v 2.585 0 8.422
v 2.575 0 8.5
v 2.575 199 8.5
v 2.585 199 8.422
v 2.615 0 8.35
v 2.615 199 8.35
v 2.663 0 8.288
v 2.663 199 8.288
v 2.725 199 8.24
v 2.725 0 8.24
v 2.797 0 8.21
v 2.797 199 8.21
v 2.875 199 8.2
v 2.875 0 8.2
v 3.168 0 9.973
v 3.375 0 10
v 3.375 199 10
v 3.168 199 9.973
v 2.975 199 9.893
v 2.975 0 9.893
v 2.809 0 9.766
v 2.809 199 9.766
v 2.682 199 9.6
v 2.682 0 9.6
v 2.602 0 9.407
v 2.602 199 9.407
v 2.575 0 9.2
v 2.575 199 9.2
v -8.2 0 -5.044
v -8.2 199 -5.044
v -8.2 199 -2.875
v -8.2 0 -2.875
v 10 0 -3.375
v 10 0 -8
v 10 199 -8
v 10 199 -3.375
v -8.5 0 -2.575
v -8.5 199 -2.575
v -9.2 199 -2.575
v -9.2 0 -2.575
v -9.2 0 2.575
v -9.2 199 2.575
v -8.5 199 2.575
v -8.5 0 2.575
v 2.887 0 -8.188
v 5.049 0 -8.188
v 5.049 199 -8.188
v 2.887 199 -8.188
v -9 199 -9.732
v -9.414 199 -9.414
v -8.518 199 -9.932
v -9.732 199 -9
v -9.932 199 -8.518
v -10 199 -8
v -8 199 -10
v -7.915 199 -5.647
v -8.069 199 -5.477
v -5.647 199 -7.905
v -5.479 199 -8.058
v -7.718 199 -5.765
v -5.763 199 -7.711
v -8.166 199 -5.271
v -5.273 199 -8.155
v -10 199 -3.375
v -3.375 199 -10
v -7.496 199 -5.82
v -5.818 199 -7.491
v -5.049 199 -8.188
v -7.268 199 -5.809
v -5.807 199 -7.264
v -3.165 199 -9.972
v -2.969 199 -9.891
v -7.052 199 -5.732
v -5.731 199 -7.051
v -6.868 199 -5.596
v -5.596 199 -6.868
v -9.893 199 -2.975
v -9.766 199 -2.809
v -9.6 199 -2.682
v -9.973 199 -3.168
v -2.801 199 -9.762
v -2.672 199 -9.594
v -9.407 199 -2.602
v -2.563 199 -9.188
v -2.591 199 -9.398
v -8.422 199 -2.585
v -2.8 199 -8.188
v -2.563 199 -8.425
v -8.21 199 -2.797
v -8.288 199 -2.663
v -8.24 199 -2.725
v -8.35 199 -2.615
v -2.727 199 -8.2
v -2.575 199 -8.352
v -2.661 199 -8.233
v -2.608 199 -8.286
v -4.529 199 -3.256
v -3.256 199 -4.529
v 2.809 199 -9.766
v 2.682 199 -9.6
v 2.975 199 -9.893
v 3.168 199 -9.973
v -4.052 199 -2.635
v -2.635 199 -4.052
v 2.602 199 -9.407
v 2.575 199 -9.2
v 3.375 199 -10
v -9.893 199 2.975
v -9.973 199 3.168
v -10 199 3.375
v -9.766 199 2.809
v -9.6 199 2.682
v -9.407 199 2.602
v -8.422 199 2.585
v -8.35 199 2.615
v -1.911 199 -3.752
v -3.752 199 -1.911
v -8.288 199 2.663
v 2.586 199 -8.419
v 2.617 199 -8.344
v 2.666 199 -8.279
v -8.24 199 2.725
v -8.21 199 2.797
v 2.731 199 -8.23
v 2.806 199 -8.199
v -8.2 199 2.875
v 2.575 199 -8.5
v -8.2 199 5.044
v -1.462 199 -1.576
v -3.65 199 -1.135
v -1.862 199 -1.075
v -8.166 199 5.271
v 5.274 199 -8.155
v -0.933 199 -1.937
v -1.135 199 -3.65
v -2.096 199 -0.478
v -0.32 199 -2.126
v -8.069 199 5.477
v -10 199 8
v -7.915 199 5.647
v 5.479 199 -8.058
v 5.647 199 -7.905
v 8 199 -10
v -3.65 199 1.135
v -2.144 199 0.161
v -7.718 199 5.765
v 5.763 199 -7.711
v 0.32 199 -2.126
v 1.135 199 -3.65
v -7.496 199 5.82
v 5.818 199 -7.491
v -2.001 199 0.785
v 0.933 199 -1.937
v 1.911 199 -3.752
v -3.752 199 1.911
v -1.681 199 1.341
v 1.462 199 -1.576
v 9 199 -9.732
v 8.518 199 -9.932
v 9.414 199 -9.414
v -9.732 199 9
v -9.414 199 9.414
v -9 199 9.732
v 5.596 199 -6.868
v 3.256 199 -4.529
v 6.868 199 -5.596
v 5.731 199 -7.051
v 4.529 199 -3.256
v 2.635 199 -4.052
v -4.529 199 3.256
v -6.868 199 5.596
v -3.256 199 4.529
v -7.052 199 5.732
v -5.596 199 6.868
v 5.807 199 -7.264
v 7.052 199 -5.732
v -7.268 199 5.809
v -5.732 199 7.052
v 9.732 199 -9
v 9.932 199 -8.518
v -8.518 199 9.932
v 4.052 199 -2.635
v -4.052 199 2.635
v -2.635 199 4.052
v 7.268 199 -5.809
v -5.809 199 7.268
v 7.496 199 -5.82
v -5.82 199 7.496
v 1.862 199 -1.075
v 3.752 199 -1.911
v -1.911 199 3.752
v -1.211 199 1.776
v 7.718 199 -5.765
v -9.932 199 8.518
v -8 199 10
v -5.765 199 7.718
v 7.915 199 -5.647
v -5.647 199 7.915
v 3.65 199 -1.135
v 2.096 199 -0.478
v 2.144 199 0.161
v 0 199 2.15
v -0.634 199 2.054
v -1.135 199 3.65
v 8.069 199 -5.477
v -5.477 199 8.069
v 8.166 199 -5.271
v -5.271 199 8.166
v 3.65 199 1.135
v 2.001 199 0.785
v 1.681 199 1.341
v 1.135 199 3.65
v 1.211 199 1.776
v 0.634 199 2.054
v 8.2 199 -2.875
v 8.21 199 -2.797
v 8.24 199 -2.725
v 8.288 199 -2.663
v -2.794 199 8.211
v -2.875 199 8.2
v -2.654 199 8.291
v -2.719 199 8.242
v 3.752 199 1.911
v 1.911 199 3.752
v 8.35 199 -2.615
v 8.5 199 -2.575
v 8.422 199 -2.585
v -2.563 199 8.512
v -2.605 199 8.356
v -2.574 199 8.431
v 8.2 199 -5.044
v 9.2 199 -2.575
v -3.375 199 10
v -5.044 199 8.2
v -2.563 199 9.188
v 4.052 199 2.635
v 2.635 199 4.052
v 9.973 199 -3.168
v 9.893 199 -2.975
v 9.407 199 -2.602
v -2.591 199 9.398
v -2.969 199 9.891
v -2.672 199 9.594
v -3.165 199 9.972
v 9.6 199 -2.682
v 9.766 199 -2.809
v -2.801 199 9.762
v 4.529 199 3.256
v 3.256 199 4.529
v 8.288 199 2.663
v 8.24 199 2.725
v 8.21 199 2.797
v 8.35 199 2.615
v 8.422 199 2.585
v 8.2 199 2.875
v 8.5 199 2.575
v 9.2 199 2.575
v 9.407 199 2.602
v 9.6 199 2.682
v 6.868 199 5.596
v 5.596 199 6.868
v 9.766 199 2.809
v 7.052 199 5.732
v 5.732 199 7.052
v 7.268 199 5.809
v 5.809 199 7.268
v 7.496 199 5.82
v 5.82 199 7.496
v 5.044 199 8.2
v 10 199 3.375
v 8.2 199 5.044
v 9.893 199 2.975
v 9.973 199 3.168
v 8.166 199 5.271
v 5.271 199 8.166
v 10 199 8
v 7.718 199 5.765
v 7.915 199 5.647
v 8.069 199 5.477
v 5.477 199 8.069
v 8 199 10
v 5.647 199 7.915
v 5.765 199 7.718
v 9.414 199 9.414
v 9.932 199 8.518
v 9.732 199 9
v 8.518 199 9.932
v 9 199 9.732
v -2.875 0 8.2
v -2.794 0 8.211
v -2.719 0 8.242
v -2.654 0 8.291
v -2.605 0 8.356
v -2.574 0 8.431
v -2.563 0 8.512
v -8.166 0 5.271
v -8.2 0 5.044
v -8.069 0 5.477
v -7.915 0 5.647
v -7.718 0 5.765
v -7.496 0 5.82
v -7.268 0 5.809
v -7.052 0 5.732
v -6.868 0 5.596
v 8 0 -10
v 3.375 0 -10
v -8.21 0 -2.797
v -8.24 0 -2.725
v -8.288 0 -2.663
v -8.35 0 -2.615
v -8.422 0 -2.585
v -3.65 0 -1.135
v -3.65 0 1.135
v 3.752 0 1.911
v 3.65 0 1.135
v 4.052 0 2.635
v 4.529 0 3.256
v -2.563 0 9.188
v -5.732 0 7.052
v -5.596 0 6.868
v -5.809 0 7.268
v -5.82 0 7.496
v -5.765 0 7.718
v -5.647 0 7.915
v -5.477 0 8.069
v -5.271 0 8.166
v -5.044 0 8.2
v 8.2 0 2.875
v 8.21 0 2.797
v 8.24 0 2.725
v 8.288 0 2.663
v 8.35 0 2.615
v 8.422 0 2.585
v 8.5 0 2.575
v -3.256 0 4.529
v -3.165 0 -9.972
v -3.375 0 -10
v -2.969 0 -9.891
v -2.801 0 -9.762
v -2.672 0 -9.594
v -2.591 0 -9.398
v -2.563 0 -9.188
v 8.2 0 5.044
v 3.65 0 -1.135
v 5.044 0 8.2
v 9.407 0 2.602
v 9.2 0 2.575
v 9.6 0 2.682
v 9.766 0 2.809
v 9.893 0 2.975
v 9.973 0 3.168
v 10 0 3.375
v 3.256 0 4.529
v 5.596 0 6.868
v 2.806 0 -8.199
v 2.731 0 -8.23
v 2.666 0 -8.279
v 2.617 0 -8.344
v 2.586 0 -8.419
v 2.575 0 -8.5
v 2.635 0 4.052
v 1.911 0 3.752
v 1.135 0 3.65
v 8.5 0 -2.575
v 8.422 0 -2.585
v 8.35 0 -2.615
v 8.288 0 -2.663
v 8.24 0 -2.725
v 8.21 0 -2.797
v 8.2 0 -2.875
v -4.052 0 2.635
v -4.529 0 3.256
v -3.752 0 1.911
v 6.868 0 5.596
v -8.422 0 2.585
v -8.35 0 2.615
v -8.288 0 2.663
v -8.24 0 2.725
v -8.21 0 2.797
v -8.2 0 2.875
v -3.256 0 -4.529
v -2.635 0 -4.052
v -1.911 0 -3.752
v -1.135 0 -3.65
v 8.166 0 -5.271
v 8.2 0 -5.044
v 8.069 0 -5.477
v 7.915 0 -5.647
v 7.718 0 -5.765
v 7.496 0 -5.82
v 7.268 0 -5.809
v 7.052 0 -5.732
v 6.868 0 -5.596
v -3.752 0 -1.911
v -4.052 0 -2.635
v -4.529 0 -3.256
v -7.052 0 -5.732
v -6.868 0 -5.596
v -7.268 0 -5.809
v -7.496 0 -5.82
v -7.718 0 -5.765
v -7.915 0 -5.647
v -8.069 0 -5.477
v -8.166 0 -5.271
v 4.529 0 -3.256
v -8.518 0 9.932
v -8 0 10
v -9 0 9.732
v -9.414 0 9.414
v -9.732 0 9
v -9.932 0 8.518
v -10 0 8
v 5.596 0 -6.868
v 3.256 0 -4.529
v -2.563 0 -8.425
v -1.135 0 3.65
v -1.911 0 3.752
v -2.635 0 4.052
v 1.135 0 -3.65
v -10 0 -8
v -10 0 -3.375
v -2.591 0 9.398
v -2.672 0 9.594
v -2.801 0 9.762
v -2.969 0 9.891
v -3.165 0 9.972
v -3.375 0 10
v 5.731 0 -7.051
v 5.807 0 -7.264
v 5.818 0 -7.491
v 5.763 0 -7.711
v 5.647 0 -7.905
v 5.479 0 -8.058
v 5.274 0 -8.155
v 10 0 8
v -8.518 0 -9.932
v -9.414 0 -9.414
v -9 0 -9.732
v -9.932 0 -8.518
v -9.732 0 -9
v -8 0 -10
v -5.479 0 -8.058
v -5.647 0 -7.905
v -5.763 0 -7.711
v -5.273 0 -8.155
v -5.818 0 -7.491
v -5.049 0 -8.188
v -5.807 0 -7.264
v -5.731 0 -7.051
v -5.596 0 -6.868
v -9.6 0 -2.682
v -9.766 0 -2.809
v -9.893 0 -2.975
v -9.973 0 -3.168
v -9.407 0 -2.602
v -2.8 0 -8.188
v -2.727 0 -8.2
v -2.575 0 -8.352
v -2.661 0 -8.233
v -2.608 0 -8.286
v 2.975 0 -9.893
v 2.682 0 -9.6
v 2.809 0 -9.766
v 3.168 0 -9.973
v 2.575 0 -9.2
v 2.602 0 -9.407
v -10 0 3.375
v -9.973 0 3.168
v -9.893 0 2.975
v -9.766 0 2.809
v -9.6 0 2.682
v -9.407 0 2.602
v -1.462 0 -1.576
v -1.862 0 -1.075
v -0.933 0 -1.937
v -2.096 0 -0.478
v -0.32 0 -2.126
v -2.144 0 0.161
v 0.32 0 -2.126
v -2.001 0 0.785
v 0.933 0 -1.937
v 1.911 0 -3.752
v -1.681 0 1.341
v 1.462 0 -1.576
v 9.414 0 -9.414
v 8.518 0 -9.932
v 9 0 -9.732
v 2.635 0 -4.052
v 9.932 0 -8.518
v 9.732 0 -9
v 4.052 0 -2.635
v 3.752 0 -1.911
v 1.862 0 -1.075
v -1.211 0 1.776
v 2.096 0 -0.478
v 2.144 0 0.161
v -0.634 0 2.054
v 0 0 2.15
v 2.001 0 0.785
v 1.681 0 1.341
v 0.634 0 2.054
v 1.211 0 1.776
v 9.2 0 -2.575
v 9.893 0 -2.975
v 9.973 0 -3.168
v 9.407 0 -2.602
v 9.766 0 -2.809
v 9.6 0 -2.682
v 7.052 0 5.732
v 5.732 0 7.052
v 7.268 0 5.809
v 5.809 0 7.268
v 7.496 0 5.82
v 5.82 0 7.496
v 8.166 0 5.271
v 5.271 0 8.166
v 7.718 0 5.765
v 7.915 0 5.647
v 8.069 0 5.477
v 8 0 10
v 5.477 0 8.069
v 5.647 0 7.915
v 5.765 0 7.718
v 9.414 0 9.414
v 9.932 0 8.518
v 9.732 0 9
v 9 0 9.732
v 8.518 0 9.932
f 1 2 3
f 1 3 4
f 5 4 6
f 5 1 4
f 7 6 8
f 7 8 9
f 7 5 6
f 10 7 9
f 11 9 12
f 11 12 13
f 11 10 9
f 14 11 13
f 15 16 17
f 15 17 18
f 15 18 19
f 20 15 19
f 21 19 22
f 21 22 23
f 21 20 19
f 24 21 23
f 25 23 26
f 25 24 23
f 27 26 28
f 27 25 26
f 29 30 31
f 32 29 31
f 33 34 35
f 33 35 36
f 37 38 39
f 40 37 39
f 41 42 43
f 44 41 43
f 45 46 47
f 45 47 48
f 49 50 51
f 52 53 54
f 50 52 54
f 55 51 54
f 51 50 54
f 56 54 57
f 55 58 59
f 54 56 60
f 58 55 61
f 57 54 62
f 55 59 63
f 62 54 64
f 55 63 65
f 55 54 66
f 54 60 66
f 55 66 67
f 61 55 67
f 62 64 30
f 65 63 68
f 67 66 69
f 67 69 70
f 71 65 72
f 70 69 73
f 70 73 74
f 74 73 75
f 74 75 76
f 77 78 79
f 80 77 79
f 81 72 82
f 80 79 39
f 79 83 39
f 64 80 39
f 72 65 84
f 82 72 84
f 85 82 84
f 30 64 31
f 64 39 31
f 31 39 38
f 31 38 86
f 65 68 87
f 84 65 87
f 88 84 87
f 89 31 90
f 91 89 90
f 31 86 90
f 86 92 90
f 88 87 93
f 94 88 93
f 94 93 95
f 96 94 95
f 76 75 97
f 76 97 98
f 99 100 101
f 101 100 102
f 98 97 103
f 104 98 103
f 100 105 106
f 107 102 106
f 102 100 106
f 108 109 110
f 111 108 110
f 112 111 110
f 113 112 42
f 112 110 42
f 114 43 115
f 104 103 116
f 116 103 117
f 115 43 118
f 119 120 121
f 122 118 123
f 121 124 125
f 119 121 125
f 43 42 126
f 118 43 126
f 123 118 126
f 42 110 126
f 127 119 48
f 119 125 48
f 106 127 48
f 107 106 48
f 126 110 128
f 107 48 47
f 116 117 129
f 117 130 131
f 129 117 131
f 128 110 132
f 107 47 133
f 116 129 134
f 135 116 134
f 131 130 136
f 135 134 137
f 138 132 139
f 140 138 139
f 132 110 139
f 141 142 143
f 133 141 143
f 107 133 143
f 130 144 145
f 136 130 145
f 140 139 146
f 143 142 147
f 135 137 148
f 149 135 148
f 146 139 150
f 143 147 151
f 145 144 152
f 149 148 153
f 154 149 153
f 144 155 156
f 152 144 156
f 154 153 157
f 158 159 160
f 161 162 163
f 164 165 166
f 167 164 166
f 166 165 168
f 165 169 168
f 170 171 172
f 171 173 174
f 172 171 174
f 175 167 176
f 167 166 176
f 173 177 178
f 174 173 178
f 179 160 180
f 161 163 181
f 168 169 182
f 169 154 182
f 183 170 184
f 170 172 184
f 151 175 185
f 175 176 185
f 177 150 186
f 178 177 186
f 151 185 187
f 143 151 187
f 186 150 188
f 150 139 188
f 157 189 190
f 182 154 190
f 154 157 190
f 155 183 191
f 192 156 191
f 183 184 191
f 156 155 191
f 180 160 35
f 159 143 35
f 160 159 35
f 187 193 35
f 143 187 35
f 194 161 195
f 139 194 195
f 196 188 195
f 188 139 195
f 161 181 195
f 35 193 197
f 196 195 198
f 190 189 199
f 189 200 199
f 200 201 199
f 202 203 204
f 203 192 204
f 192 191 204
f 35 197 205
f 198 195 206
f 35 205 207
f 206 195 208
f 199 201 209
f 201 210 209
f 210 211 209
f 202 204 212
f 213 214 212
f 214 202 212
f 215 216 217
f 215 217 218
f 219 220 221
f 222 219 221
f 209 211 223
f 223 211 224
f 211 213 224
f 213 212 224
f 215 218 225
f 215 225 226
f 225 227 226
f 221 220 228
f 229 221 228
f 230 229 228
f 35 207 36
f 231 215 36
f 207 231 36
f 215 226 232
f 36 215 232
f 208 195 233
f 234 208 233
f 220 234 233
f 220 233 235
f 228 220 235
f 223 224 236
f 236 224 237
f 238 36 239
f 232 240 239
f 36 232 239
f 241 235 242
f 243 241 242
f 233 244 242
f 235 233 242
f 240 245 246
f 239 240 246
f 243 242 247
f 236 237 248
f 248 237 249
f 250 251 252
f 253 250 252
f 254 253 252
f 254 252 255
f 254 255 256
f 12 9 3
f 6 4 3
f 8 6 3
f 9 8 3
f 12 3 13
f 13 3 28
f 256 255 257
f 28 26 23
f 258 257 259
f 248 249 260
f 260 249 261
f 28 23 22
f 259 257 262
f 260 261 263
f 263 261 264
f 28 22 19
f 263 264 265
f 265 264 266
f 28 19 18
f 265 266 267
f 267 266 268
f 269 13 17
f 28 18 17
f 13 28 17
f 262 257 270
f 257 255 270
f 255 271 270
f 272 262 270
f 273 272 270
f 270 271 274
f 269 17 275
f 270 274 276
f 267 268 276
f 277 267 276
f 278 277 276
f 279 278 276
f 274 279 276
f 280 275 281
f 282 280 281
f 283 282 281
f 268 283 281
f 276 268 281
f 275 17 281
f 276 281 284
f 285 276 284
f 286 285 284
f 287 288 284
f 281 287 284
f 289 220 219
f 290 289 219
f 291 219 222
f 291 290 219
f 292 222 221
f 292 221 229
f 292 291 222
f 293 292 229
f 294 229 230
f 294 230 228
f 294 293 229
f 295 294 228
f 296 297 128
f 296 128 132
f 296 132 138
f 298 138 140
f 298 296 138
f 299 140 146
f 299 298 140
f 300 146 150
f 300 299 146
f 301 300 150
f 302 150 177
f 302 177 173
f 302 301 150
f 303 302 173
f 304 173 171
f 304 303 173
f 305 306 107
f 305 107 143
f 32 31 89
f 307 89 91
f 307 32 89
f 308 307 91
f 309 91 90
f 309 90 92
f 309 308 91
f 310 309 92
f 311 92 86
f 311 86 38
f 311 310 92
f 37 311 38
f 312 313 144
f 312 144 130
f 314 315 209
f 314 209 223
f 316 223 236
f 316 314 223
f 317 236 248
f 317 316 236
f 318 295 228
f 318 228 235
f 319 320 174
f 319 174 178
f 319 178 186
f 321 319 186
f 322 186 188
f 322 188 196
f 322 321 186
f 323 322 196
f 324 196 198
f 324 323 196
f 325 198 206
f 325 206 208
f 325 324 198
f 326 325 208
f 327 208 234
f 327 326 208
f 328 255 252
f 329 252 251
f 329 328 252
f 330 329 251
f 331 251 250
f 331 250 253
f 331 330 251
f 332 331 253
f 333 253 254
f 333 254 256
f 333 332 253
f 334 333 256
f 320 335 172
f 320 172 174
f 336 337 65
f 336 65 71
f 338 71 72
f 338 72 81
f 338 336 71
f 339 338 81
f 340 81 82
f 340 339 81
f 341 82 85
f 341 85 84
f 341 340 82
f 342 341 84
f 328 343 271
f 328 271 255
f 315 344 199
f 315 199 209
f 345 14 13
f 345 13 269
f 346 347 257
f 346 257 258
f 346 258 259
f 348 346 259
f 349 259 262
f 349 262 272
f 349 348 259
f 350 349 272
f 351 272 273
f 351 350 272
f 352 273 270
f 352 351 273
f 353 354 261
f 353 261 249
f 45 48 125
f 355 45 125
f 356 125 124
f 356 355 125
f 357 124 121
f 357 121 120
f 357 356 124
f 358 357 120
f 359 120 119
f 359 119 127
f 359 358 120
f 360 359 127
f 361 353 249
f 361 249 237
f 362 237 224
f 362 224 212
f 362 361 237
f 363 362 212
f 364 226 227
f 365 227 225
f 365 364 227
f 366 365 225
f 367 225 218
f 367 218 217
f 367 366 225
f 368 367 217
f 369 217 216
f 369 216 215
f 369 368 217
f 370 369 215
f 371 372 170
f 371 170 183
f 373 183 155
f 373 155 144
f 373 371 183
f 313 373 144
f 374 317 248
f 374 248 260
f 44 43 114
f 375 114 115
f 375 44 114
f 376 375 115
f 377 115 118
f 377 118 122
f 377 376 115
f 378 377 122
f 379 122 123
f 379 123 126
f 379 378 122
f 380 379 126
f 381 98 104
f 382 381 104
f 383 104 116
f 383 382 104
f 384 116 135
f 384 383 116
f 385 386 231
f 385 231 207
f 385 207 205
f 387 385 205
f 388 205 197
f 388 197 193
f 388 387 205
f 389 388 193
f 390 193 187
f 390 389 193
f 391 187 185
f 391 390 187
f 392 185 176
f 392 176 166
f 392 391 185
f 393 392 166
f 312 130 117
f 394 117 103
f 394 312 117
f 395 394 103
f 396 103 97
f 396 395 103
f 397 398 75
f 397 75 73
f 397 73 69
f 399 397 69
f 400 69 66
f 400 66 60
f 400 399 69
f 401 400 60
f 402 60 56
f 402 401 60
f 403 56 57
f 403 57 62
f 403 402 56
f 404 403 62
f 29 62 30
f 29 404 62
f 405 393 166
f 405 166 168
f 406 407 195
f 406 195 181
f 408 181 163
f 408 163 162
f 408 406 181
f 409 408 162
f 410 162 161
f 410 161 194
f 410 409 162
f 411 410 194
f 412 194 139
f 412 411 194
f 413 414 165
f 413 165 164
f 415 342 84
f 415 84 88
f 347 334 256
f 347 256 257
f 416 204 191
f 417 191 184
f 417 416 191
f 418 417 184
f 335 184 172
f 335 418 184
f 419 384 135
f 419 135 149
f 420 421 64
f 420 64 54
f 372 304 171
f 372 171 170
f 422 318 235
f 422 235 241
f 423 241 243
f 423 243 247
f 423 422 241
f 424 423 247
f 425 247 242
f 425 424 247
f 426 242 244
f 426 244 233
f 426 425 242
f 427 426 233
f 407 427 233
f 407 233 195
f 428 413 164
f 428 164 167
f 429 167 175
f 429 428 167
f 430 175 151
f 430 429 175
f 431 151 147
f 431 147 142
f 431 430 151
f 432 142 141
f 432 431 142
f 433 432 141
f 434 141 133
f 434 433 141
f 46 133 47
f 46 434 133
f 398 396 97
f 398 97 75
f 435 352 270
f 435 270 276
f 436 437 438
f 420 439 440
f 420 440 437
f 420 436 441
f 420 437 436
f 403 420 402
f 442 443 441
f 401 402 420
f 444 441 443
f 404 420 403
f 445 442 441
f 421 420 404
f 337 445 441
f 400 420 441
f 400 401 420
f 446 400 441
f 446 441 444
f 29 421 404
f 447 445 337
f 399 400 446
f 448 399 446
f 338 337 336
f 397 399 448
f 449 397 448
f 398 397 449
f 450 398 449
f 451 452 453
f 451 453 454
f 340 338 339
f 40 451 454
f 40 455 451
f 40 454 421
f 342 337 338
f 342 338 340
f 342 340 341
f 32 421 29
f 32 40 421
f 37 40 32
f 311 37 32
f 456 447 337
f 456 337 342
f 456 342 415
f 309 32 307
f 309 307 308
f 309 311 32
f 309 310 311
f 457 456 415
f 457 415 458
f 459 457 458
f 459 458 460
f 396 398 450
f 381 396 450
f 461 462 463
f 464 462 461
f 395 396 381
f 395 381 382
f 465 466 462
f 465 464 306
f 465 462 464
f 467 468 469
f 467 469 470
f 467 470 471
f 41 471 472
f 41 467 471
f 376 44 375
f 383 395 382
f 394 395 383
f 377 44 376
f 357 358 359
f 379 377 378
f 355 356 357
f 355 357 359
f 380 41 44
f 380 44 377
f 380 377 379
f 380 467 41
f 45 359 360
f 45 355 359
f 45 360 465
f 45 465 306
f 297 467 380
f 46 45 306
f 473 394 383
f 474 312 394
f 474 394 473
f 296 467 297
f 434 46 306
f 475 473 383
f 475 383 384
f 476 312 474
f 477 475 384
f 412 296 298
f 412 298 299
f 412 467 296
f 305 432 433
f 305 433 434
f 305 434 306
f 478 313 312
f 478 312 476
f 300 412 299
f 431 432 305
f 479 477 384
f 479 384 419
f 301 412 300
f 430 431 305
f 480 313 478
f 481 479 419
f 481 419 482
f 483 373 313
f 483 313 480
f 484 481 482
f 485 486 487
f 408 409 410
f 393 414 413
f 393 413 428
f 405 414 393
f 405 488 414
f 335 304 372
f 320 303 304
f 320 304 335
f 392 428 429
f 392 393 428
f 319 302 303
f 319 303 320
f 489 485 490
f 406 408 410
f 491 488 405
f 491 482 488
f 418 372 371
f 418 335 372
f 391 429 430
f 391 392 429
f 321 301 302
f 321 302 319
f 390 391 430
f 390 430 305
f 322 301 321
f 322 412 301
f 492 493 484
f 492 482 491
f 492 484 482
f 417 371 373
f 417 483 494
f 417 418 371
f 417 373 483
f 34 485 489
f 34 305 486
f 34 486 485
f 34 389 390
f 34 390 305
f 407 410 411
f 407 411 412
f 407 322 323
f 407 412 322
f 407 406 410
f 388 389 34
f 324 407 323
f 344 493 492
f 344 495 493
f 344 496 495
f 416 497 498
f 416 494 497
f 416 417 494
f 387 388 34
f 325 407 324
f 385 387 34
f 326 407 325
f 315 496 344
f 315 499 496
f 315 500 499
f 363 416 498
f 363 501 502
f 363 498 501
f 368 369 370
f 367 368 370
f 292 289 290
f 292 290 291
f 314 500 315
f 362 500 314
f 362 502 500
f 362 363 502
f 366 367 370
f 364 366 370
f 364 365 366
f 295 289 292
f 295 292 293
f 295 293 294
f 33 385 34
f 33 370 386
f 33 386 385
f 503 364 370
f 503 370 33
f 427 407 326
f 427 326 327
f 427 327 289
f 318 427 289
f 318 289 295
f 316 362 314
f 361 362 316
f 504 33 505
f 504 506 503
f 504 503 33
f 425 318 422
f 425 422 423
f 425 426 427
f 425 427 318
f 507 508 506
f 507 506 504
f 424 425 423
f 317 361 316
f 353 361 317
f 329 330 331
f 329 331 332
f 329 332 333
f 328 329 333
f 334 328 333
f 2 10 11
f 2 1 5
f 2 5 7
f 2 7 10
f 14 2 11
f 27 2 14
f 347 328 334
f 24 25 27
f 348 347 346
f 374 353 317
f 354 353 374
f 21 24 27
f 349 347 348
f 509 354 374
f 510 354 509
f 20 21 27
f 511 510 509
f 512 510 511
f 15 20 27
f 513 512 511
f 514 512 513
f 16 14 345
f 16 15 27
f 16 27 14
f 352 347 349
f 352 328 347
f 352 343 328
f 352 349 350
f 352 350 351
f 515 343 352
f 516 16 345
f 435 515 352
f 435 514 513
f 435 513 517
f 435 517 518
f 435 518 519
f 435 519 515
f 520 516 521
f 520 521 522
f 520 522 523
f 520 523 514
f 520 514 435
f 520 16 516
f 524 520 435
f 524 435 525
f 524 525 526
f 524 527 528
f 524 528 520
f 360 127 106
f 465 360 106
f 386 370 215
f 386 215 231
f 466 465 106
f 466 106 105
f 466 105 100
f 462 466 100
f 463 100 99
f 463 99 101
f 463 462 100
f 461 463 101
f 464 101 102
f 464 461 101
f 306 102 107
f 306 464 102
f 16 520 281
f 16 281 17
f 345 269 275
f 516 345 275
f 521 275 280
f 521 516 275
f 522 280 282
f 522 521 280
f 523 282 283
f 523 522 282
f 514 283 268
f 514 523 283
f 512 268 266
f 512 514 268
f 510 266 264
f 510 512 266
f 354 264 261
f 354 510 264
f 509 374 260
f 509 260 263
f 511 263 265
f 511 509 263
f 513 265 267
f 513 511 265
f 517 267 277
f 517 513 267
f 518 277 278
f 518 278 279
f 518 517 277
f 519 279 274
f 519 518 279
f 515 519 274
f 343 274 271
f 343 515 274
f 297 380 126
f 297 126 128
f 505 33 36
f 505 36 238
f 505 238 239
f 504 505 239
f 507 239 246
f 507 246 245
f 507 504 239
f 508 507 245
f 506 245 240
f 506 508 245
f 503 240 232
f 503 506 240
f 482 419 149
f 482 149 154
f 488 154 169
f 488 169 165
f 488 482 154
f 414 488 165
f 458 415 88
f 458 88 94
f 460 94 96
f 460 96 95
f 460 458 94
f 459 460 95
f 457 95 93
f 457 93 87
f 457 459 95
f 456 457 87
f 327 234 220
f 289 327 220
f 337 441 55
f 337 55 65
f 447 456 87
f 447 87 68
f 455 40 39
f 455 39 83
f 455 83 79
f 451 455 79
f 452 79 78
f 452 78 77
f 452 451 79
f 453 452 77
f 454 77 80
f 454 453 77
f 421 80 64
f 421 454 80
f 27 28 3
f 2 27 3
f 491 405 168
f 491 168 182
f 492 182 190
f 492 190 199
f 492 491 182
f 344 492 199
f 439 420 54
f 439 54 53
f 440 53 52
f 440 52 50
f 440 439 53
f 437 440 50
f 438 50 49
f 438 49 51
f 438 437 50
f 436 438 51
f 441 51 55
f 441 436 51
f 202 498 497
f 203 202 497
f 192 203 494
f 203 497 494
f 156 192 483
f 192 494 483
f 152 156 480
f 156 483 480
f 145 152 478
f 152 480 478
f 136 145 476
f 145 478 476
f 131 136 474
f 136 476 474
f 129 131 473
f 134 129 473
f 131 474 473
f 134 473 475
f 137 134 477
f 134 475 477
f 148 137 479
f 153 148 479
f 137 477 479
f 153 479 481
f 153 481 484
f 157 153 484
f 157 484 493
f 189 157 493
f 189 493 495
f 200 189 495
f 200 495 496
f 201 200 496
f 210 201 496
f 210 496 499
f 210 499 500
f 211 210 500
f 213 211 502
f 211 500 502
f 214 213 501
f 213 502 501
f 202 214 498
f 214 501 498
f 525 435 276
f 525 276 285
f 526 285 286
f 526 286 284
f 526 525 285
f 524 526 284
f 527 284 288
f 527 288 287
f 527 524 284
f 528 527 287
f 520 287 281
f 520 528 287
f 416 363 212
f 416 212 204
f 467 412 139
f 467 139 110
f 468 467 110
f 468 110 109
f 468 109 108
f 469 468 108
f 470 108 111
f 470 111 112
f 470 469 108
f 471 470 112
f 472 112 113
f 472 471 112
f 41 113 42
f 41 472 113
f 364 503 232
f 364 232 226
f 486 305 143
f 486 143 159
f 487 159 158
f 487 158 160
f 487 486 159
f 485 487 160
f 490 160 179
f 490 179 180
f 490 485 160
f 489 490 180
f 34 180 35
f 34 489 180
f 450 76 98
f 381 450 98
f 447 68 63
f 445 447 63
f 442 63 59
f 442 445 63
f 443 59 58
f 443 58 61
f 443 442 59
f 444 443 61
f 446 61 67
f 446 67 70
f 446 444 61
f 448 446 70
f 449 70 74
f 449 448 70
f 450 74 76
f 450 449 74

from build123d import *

# Parameters (mm, degrees)
SKETCH1_R           = 2.15
BOSS_EXTRUDE1_DEPTH = 199


with BuildPart() as part:
    # Sketch1 → Boss-Extrude1 (new body)
    with BuildSketch(Plane.XZ):
        with BuildLine():
            Line((-3.375, 10), (-8, 10))
            ThreePointArc((-8, 10), (-9.414213562, 9.414213562), (-10, 8))
            Line((-10, 8), (-10, 3.375))
            ThreePointArc((-10, 3.375), (-9.765685425, 2.809314575), (-9.2, 2.575))
            Line((-9.2, 2.575), (-8.500000763, 2.575))
            ThreePointArc((-8.500000763, 2.575), (-8.287868729, 2.662867966), (-8.200000763, 2.875))
            Line((-8.200000763, 2.875), (-8.200000763, 5.044121369))
            ThreePointArc((-8.200000763, 5.044121369), (-7.71849397, 5.76474735), (-6.868457672, 5.595664857))
            Line((-6.868457672, 5.595664857), (-4.528679789, 3.255888659))
            ThreePointArc((-4.528679789, 3.255888659), (-3.878360978, 2.282618348), (-3.649999368, 1.134567552))
            Line((-3.649999368, 1.134567552), (-3.649999368, -1.134567779))
            ThreePointArc((-3.649999368, -1.134567779), (-3.878360979, -2.282618579), (-4.528679795, -3.255888892))
            Line((-4.528679795, -3.255888892), (-6.868457674, -5.595665072))
            ThreePointArc((-6.868457674, -5.595665072), (-7.718493971, -5.764747564), (-8.200000763, -5.044121583))
            Line((-8.200000763, -5.044121583), (-8.200000763, -2.875))
            ThreePointArc((-8.200000763, -2.875), (-8.287868729, -2.662867966), (-8.500000763, -2.575))
            Line((-8.500000763, -2.575), (-9.2, -2.575))
            ThreePointArc((-9.2, -2.575), (-9.765685425, -2.809314575), (-10, -3.375))
            Line((-10, -3.375), (-10, -8))
            ThreePointArc((-10, -8), (-9.414213562, -9.414213562), (-8, -10))
            Line((-8, -10), (-3.375, -10))
            ThreePointArc((-3.375, -10), (-2.800759206, -9.762141675), (-2.562900881, -9.187900881))
            Line((-2.562900881, -9.187900881), (-2.562900881, -8.425196206))
            ThreePointArc((-2.562900881, -8.425196206), (-2.632402849, -8.257403612), (-2.800195443, -8.187901644))
            Line((-2.800195443, -8.187901644), (-5.049133208, -8.187901644))
            ThreePointArc((-5.049133208, -8.187901644), (-5.763211193, -7.710770081), (-5.595665074, -6.868457672))
            Line((-5.595665074, -6.868457672), (-3.255888886, -4.528679799))
            ThreePointArc((-3.255888886, -4.528679799), (-2.282618575, -3.878360987), (-1.134567778, -3.649999378))
            Line((-1.134567778, -3.649999378), (1.134573171, -3.649999378))
            ThreePointArc((1.134573171, -3.649999378), (2.282622968, -3.878360573), (3.25589275, -4.52867827))
            Line((3.25589275, -4.52867827), (5.595670922, -6.868454756))
            ThreePointArc((5.595670922, -6.868454756), (5.763217861, -7.710768912), (5.049138405, -8.187901644))
            Line((5.049138405, -8.187901644), (2.887098902, -8.187901644))
            ThreePointArc((2.887098902, -8.187901644), (2.666411499, -8.279313359), (2.574999783, -8.500000763))
            Line((2.574999783, -8.500000763), (2.574999783, -9.2))
            ThreePointArc((2.574999783, -9.2), (2.809314358, -9.765685425), (3.374999783, -10))
            Line((3.374999783, -10), (8, -10))
            ThreePointArc((8, -10), (9.414213562, -9.414213562), (10, -8))
            Line((10, -8), (10, -3.375))
            ThreePointArc((10, -3.375), (9.765685425, -2.809314575), (9.2, -2.575))
            Line((9.2, -2.575), (8.499995064, -2.575))
            ThreePointArc((8.499995064, -2.575), (8.28786303, -2.662867966), (8.199995064, -2.875))
            Line((8.199995064, -2.875), (8.199995064, -5.044124934))
            ThreePointArc((8.199995064, -5.044124934), (7.71848801, -5.764751024), (6.868451574, -5.595668024))
            Line((6.868451574, -5.595668024), (4.528675393, -3.255890143))
            ThreePointArc((4.528675393, -3.255890143), (3.878357701, -2.282620364), (3.649996507, -1.13457057))
            Line((3.649996507, -1.13457057), (3.649996507, 1.134570517))
            ThreePointArc((3.649996507, 1.134570517), (3.878357702, 2.282620314), (4.528675399, 3.255890096))
            Line((4.528675399, 3.255890096), (6.868450549, 5.595666932))
            ThreePointArc((6.868450549, 5.595666932), (7.71848764, 5.764750061), (8.199995064, 5.044123416))
            Line((8.199995064, 5.044123416), (8.199995064, 2.875))
            ThreePointArc((8.199995064, 2.875), (8.28786303, 2.662867966), (8.499995064, 2.575))
            Line((8.499995064, 2.575), (9.2, 2.575))
            ThreePointArc((9.2, 2.575), (9.765685425, 2.809314575), (10, 3.375))
            Line((10, 3.375), (10, 8))
            ThreePointArc((10, 8), (9.414213562, 9.414213562), (8, 10))
            Line((8, 10), (3.374999783, 10))
            ThreePointArc((3.374999783, 10), (2.809314358, 9.765685425), (2.574999783, 9.2))
            Line((2.574999783, 9.2), (2.574999783, 8.500000763))
            ThreePointArc((2.574999783, 8.500000763), (2.662867749, 8.287868729), (2.874999783, 8.200000763))
            Line((2.874999783, 8.200000763), (5.044126937, 8.200000763))
            ThreePointArc((5.044126937, 8.200000763), (5.764754441, 7.718492764), (5.595671108, 6.868454659))
            Line((5.595671108, 6.868454659), (3.255893005, 4.528678255))
            ThreePointArc((3.255893005, 4.528678255), (2.282623225, 3.878360562), (1.134573431, 3.649999368))
            Line((1.134573431, 3.649999368), (-1.134567779, 3.649999368))
            ThreePointArc((-1.134567779, 3.649999368), (-2.282618579, 3.878360979), (-3.255888892, 4.528679795))
            Line((-3.255888892, 4.528679795), (-5.595665072, 6.868457674))
            ThreePointArc((-5.595665072, 6.868457674), (-5.764747564, 7.718493971), (-5.044121583, 8.200000763))
            Line((-5.044121583, 8.200000763), (-2.875, 8.200000763))
            ThreePointArc((-2.875, 8.200000763), (-2.654312596, 8.291412479), (-2.562900881, 8.512099882))
            Line((-2.562900881, 8.512099882), (-2.562900881, 9.187900881))
            ThreePointArc((-2.562900881, 9.187900881), (-2.800759206, 9.762141675), (-3.375, 10))
        make_face()
        with Locations(Location((0, 0, 0), (0, 0, 90))):
            Circle(SKETCH1_R, mode=Mode.SUBTRACT)
    extrude(amount=-BOSS_EXTRUDE1_DEPTH)


solid = part.part
